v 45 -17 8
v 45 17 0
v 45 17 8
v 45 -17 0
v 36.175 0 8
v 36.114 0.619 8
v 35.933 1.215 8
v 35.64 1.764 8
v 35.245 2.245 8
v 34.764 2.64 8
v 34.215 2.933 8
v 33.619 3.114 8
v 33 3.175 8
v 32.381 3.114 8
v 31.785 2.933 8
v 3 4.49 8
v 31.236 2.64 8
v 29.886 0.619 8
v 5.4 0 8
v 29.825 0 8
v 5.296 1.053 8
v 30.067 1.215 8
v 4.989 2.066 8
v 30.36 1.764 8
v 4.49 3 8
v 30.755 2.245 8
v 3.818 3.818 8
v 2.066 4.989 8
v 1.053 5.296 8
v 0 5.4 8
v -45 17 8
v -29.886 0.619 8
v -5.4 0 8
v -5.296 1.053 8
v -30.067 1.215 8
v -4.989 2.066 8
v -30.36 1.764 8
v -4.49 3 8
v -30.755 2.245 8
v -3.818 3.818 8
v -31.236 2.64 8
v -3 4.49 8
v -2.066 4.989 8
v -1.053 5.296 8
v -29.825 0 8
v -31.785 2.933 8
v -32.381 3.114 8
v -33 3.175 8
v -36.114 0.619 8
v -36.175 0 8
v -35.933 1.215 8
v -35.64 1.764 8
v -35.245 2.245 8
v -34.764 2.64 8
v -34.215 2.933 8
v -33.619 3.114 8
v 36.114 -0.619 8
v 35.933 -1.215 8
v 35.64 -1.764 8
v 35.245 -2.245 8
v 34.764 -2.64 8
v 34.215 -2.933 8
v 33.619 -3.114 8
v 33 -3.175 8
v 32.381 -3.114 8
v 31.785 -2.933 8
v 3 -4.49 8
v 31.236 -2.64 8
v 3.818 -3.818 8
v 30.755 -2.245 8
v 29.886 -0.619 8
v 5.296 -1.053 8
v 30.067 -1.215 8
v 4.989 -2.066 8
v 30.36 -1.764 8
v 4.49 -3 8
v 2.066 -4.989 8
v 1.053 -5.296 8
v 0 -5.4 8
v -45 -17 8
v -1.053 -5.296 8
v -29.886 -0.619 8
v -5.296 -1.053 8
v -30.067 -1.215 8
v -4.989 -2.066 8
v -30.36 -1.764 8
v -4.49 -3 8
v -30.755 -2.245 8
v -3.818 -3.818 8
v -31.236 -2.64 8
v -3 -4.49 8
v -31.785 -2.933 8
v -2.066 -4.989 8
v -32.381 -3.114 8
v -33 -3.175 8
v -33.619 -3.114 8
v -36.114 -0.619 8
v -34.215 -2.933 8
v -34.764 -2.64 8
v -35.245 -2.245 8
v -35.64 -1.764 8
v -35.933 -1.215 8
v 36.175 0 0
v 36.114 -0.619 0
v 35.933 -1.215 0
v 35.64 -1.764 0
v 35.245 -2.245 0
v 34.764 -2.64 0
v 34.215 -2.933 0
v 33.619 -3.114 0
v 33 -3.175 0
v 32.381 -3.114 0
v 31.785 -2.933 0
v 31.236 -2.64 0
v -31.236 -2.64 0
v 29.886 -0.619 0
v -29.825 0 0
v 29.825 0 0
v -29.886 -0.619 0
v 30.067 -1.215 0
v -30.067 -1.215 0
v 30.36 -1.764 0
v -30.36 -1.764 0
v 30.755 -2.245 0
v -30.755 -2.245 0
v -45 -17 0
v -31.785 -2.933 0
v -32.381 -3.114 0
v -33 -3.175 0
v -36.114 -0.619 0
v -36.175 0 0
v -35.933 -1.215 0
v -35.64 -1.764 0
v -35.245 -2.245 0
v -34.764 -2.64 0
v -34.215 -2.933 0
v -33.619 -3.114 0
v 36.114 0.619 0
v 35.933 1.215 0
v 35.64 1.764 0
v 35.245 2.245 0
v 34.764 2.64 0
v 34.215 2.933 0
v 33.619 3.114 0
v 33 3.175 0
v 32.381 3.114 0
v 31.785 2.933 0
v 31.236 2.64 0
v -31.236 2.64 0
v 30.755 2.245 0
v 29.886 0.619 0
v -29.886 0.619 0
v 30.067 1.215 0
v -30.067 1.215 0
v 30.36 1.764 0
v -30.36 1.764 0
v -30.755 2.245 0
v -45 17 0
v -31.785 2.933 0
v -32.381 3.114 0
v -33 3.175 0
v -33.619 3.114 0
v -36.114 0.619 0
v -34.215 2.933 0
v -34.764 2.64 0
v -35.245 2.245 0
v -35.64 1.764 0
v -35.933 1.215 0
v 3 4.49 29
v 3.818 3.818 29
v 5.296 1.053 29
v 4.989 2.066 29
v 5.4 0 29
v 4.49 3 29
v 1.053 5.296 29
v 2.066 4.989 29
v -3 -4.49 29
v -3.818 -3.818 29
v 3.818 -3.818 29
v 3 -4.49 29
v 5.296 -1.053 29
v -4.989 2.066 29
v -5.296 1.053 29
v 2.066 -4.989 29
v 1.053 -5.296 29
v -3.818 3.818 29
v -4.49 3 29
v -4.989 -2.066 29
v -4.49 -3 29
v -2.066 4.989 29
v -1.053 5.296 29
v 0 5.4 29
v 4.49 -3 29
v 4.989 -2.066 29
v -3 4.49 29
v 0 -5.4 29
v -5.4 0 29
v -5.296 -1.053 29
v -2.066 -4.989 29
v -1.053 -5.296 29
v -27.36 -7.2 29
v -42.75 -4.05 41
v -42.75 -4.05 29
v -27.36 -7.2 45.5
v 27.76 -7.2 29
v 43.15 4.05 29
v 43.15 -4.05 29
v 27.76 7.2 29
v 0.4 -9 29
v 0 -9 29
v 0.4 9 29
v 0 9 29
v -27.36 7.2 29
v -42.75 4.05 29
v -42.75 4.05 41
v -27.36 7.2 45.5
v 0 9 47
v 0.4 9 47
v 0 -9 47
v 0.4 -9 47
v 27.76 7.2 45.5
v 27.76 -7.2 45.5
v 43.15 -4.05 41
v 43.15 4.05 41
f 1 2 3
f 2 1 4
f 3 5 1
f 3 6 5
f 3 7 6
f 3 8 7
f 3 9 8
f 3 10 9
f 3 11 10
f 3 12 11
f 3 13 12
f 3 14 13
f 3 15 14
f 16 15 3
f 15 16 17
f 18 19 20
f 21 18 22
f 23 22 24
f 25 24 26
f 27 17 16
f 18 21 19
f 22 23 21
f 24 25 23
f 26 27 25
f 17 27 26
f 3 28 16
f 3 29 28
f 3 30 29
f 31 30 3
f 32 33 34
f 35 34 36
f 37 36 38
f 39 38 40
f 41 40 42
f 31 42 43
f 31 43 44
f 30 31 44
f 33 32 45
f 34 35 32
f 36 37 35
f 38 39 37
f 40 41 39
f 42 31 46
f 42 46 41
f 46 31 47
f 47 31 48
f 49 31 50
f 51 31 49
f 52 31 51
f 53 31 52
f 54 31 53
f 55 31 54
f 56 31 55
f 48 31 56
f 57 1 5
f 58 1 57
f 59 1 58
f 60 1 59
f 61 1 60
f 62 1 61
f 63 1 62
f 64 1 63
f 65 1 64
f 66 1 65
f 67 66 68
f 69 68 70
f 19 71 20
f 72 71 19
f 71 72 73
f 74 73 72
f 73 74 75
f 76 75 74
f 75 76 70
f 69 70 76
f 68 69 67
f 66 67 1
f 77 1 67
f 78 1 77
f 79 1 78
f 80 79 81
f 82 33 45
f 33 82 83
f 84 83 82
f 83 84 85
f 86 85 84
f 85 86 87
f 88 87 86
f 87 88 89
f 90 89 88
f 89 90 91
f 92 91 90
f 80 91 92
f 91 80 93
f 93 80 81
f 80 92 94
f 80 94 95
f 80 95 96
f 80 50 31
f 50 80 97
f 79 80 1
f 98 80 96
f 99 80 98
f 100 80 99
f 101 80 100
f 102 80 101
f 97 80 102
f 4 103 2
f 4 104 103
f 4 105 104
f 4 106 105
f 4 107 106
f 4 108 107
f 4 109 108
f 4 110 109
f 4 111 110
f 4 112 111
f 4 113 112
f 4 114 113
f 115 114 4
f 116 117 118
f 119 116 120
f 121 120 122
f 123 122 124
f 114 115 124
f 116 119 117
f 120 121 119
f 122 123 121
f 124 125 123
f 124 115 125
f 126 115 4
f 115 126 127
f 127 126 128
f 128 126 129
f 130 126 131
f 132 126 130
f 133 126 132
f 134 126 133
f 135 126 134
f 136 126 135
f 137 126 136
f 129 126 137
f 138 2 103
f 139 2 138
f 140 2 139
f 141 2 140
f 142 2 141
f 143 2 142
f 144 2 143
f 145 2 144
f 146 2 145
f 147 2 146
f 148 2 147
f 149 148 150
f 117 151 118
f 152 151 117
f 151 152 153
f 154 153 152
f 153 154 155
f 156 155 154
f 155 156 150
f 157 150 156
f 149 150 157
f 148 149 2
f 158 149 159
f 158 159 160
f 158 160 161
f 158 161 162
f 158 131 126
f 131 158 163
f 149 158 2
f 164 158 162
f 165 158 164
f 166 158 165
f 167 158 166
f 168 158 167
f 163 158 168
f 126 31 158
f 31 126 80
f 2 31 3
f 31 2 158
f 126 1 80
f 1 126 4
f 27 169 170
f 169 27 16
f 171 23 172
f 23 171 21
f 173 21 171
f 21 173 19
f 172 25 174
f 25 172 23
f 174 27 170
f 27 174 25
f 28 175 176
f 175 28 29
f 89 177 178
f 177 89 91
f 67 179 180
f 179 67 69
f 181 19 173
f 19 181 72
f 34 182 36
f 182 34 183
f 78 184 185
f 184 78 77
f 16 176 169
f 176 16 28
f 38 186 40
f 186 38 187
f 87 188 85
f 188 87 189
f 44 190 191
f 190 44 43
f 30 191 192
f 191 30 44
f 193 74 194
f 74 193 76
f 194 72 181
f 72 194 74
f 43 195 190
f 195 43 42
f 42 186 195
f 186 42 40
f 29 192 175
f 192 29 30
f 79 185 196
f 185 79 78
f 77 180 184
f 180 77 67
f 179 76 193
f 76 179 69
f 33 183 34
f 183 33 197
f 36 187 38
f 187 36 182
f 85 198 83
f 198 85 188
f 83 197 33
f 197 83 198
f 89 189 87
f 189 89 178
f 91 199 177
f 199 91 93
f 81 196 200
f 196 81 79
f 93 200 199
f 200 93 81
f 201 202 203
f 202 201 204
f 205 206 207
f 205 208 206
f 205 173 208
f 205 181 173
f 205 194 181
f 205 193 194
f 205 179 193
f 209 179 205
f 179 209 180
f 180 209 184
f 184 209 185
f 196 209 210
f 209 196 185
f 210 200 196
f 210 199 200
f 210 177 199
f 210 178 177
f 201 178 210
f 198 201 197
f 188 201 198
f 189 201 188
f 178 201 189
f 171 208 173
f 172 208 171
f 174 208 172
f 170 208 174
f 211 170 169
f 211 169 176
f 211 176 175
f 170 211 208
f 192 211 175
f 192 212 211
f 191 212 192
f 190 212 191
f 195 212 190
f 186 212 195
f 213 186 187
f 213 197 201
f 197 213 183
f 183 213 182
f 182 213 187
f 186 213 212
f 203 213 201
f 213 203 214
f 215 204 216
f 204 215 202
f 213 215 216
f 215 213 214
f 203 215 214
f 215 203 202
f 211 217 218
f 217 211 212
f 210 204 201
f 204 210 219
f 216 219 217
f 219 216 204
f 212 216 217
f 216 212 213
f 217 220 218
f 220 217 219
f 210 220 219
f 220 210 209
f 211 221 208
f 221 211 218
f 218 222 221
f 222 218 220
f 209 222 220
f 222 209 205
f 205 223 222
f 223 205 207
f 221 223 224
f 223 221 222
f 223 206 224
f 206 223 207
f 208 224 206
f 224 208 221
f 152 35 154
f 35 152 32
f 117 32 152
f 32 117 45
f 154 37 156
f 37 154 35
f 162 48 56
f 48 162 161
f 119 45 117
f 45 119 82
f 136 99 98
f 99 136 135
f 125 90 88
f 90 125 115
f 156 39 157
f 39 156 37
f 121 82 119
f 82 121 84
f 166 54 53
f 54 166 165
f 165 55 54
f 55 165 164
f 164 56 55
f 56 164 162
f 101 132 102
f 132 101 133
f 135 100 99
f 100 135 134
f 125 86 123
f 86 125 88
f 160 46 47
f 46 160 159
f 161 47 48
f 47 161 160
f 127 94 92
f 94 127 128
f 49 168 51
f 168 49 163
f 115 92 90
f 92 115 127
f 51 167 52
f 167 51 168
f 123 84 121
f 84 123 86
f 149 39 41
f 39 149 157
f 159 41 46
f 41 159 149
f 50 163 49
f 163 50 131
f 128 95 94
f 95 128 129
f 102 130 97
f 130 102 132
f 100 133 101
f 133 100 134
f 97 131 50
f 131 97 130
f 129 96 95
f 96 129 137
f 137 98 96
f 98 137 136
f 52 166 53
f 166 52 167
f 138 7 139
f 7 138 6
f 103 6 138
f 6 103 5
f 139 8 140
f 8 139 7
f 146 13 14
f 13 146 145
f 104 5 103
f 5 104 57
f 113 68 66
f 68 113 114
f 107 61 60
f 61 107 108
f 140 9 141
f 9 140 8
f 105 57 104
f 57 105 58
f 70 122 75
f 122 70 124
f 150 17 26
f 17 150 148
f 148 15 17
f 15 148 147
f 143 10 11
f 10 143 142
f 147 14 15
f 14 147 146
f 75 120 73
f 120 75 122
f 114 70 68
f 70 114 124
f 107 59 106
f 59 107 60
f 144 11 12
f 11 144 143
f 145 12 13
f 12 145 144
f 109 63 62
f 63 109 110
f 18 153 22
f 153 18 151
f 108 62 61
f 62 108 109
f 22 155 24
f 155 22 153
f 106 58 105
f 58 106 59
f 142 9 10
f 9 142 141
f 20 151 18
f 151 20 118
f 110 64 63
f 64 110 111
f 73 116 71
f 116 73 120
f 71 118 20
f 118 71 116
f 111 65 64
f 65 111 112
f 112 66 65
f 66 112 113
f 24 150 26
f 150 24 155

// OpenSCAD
$fn = 32;

// ----------------------------------------------------------------------
// Boat cleat: 90 mm base, horn 38 mm up
// ----------------------------------------------------------------------

// --- parameters (mm) ---
base_l = 90;              // base length
base_w = 34;              // base width
base_t = 8;               // base thickness
horn_len = 85.5;          // horn length
horn_d = 18;              // horn diameter at the middle
horn_z = 38;              // horn axis height
end_drop = 6;             // how far the horn tips drop
post_d = 10.8;            // centre post diameter
holes_d = 6.35;           // fixing holes
hole_x = 33;              // fixing hole spacing

difference() {
  union() {
    translate([-45, -17, 0]) cube([base_l, base_w, base_t]);
    /* centre post, sunk 1 mm into the base */
    translate([0, 0, 7]) cylinder(h = 31, d = post_d);
    /* horn: a hull chain of boxes, full in the middle and lighter at the tips */
    hull() {
      translate([-42.75, -4.05, 29]) cube([0.4, 8.1, 12], center = false);
      translate([-27.36, -7.2, 29]) cube([0.4, 14.4, 16.5], center = false);
    }
    hull() {
      translate([-27.36, -7.2, 29]) cube([0.4, 14.4, 16.5], center = false);
      translate([0, -9, 29]) cube([0.4, 18, 18], center = false);
    }
    hull() {
      translate([0, -9, 29]) cube([0.4, 18, 18], center = false);
      translate([27.36, -7.2, 29]) cube([0.4, 14.4, 16.5], center = false);
    }
    hull() {
      translate([27.36, -7.2, 29]) cube([0.4, 14.4, 16.5], center = false);
      translate([42.75, -4.05, 29]) cube([0.4, 8.1, 12], center = false);
    }
  }
  translate([-33, 0, -2.5]) cylinder(h = base_t + 5, d = holes_d);
  translate([33, 0, -2.5]) cylinder(h = base_t + 5, d = holes_d);
}
